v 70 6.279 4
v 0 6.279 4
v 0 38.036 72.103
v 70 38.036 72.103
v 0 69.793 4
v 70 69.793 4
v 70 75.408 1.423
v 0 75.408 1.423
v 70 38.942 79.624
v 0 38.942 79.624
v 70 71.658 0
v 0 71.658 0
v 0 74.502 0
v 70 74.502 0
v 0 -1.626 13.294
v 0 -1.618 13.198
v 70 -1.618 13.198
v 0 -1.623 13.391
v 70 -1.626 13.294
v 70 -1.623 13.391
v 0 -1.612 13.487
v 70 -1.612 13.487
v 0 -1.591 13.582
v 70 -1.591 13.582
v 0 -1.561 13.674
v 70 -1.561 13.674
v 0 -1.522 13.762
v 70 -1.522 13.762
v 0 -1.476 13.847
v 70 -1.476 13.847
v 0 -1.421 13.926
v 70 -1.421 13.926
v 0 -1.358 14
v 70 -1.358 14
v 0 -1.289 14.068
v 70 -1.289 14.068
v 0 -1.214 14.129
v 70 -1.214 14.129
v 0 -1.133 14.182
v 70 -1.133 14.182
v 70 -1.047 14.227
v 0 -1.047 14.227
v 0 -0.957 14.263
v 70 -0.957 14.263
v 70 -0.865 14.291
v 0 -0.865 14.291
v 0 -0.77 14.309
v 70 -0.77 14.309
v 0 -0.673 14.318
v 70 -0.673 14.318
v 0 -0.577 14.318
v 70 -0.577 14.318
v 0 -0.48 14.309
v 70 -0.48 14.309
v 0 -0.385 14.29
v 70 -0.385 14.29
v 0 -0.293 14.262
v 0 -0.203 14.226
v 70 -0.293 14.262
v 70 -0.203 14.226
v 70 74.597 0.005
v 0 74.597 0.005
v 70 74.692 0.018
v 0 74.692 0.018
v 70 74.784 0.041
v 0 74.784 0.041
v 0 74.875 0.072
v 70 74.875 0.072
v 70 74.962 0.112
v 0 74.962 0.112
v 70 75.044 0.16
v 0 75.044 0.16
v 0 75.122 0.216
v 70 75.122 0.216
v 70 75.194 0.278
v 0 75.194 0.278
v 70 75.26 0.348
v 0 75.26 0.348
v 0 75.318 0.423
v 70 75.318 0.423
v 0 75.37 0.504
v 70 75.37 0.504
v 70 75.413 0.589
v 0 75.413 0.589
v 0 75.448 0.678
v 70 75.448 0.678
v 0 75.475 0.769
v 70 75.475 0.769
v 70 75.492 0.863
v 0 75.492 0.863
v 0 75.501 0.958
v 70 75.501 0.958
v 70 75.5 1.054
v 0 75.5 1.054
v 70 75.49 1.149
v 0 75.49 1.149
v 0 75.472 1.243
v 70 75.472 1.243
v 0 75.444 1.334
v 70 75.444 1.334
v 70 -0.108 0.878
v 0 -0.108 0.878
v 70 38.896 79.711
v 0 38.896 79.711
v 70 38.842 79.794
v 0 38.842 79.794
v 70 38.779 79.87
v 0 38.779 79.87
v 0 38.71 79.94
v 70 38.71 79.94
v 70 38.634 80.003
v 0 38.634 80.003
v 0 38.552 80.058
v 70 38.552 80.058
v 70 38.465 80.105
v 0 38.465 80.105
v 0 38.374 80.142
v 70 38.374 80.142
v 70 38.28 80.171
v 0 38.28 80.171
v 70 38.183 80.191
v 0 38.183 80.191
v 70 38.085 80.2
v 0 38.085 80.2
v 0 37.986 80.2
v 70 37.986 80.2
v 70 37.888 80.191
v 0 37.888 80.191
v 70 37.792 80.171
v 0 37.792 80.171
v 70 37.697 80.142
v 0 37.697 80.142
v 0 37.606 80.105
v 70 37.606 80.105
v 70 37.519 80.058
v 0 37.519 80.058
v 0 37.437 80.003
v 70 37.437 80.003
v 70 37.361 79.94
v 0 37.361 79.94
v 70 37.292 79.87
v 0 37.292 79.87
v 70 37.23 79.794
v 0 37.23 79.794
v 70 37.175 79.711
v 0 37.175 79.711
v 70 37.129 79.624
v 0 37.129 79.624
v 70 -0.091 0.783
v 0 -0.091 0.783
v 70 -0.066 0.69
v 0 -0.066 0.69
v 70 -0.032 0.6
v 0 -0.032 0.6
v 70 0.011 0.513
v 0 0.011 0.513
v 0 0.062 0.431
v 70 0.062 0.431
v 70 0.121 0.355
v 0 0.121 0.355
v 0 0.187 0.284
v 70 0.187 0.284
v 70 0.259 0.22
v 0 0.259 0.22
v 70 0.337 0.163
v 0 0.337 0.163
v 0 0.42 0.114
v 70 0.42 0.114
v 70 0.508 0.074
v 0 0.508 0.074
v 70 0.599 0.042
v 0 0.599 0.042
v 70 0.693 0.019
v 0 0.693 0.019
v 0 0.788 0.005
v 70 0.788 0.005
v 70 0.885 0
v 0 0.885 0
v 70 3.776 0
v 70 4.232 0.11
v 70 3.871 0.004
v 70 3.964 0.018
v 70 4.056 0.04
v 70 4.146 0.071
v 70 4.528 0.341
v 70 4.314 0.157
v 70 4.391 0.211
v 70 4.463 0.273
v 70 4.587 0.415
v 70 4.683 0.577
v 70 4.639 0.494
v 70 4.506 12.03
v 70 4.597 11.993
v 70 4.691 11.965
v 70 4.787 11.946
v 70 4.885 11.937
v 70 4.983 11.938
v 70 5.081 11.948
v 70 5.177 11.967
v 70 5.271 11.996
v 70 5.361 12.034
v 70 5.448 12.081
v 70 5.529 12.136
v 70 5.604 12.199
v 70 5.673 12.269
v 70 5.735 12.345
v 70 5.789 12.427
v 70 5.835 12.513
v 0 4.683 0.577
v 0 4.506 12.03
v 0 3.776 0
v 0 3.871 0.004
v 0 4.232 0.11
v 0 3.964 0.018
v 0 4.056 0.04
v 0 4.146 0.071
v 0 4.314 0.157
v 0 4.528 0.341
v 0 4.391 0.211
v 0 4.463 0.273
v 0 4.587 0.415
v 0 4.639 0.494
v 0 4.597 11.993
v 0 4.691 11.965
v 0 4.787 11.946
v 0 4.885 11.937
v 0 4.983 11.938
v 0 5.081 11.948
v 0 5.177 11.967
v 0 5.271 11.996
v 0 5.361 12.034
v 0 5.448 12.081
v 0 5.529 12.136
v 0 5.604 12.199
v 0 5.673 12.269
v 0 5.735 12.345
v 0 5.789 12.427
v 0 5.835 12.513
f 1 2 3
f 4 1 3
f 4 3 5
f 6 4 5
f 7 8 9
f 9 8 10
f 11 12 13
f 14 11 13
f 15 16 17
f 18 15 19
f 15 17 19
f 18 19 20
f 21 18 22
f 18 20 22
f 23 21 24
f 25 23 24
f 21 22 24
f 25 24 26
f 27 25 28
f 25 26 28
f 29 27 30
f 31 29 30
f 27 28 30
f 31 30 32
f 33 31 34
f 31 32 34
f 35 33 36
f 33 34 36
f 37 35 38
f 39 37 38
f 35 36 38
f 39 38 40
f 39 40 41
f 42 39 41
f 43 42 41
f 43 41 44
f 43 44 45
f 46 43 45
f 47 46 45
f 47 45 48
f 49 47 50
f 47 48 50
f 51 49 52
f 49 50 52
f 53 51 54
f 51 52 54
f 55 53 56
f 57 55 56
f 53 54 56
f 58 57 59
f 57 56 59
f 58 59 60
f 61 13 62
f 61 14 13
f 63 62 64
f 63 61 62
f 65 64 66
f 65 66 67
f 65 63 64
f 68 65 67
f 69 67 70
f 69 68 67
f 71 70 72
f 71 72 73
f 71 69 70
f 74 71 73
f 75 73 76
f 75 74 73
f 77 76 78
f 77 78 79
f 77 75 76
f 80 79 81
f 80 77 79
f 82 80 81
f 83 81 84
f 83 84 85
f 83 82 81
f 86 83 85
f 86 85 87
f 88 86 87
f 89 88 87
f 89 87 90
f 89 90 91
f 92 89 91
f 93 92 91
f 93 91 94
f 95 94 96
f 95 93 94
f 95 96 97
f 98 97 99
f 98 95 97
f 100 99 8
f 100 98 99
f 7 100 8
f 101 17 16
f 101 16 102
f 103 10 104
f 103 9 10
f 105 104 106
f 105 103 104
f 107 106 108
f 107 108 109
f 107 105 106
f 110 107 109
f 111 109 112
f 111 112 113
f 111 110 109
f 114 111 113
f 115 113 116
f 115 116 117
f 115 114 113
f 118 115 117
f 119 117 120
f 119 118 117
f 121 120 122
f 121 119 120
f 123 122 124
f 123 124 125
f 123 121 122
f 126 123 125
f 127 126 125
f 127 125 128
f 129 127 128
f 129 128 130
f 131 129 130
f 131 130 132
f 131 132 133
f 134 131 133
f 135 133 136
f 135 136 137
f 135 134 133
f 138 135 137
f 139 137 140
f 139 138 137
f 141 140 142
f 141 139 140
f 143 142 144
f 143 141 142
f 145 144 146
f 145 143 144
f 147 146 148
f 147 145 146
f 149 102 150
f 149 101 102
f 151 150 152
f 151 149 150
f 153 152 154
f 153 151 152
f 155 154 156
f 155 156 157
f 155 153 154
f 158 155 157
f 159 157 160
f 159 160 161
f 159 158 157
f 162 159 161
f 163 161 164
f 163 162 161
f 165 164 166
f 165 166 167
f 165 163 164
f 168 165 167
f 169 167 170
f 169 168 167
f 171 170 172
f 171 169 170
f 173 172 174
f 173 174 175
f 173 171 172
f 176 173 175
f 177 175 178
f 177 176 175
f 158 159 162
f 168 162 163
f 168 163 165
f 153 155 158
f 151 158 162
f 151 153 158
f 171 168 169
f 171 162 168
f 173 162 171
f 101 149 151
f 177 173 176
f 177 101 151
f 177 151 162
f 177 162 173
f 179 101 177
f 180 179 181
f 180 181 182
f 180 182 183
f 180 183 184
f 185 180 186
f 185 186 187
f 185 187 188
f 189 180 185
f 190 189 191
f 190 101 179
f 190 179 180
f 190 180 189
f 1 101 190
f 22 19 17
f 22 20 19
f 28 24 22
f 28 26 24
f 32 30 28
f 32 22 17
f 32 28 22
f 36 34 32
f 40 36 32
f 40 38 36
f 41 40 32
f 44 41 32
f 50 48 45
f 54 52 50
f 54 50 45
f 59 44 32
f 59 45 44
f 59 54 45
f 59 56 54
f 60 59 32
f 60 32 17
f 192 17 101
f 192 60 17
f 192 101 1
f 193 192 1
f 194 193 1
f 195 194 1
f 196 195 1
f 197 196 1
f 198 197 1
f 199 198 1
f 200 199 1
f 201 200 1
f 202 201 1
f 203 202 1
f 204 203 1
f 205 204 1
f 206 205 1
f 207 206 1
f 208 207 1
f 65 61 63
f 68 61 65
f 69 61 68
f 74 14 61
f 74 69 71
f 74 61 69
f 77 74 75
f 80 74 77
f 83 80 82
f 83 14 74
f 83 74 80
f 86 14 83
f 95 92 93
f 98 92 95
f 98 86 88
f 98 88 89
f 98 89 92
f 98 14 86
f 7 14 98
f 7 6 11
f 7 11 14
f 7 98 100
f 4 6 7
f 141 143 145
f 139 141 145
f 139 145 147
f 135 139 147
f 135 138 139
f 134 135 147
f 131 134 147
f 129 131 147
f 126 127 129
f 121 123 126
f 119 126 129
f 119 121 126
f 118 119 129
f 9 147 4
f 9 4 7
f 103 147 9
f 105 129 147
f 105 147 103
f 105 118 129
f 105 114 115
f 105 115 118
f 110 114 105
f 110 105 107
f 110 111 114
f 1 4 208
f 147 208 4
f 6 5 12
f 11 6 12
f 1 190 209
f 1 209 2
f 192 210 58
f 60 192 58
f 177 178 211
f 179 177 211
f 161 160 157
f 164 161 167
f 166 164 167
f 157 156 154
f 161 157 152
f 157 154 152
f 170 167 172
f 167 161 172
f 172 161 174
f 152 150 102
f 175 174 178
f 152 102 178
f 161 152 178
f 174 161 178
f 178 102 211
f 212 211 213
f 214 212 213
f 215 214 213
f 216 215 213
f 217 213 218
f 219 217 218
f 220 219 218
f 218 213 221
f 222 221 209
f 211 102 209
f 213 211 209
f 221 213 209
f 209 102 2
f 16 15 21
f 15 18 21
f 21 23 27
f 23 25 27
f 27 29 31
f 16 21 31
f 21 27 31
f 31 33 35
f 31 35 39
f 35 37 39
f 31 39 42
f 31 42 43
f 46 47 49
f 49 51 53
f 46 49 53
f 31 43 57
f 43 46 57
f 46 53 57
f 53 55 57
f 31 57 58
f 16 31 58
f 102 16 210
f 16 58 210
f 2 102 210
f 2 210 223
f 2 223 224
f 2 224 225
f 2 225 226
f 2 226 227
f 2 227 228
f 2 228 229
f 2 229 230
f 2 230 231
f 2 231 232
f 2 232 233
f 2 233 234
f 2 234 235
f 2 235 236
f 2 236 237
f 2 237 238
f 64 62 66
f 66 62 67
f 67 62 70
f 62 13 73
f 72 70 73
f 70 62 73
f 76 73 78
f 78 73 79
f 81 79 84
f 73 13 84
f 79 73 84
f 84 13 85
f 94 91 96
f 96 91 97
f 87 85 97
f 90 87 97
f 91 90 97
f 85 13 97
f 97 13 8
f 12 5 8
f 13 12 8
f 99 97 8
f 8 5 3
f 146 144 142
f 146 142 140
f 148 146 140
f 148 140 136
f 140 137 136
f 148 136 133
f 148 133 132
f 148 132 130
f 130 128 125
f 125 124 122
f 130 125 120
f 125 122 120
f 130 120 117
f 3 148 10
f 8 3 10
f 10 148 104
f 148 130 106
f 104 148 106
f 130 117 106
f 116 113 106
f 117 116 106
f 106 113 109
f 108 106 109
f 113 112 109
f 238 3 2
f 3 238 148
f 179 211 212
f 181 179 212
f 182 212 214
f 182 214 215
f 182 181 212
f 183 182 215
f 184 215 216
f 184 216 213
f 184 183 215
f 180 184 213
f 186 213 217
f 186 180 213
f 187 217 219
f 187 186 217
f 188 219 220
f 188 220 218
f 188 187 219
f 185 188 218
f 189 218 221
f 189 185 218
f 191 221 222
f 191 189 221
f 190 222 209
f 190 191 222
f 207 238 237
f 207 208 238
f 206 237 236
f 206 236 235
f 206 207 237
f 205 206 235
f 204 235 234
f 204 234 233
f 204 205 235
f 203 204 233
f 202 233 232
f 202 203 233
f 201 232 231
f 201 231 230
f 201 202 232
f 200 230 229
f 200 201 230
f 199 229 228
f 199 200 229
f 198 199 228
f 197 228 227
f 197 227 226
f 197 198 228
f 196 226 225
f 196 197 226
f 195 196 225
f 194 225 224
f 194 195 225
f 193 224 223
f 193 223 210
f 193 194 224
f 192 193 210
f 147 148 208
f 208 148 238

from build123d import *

# Parameters (mm, degrees)
F1_DEPTH = 70
F2_R     = 1


with BuildPart() as f1:
    # F0 (on Right) → F1 (new body)
    with BuildSketch(Plane.YZ):
        Polygon((-1.8379441239, 14.9881287721), (0, 0), (4.4135116758, 0), (6.2787423085, 4), (38.0356435567, 72.1028945007), (69.7925448049, 4), (71.6577754375, 0), (76.0712871133, 0), (38.0356435567, 81.5677008333), (5.4125181724, 11.6071826782), align=None)
    extrude(amount=F1_DEPTH)

    # F2
    f2_edges = [f1.edges().sort_by_distance(p)[0] for p in [
        (35, -1.837944, 14.988129),
        (35, 5.412518, 11.607183),
        (35, 38.035644, 81.567701),
        (35, 0, 0),
        (35, 76.071287, 0),
        (35, 4.413512, 0),
    ]]
    fillet(f2_edges, radius=F2_R)


solid = f1.part
